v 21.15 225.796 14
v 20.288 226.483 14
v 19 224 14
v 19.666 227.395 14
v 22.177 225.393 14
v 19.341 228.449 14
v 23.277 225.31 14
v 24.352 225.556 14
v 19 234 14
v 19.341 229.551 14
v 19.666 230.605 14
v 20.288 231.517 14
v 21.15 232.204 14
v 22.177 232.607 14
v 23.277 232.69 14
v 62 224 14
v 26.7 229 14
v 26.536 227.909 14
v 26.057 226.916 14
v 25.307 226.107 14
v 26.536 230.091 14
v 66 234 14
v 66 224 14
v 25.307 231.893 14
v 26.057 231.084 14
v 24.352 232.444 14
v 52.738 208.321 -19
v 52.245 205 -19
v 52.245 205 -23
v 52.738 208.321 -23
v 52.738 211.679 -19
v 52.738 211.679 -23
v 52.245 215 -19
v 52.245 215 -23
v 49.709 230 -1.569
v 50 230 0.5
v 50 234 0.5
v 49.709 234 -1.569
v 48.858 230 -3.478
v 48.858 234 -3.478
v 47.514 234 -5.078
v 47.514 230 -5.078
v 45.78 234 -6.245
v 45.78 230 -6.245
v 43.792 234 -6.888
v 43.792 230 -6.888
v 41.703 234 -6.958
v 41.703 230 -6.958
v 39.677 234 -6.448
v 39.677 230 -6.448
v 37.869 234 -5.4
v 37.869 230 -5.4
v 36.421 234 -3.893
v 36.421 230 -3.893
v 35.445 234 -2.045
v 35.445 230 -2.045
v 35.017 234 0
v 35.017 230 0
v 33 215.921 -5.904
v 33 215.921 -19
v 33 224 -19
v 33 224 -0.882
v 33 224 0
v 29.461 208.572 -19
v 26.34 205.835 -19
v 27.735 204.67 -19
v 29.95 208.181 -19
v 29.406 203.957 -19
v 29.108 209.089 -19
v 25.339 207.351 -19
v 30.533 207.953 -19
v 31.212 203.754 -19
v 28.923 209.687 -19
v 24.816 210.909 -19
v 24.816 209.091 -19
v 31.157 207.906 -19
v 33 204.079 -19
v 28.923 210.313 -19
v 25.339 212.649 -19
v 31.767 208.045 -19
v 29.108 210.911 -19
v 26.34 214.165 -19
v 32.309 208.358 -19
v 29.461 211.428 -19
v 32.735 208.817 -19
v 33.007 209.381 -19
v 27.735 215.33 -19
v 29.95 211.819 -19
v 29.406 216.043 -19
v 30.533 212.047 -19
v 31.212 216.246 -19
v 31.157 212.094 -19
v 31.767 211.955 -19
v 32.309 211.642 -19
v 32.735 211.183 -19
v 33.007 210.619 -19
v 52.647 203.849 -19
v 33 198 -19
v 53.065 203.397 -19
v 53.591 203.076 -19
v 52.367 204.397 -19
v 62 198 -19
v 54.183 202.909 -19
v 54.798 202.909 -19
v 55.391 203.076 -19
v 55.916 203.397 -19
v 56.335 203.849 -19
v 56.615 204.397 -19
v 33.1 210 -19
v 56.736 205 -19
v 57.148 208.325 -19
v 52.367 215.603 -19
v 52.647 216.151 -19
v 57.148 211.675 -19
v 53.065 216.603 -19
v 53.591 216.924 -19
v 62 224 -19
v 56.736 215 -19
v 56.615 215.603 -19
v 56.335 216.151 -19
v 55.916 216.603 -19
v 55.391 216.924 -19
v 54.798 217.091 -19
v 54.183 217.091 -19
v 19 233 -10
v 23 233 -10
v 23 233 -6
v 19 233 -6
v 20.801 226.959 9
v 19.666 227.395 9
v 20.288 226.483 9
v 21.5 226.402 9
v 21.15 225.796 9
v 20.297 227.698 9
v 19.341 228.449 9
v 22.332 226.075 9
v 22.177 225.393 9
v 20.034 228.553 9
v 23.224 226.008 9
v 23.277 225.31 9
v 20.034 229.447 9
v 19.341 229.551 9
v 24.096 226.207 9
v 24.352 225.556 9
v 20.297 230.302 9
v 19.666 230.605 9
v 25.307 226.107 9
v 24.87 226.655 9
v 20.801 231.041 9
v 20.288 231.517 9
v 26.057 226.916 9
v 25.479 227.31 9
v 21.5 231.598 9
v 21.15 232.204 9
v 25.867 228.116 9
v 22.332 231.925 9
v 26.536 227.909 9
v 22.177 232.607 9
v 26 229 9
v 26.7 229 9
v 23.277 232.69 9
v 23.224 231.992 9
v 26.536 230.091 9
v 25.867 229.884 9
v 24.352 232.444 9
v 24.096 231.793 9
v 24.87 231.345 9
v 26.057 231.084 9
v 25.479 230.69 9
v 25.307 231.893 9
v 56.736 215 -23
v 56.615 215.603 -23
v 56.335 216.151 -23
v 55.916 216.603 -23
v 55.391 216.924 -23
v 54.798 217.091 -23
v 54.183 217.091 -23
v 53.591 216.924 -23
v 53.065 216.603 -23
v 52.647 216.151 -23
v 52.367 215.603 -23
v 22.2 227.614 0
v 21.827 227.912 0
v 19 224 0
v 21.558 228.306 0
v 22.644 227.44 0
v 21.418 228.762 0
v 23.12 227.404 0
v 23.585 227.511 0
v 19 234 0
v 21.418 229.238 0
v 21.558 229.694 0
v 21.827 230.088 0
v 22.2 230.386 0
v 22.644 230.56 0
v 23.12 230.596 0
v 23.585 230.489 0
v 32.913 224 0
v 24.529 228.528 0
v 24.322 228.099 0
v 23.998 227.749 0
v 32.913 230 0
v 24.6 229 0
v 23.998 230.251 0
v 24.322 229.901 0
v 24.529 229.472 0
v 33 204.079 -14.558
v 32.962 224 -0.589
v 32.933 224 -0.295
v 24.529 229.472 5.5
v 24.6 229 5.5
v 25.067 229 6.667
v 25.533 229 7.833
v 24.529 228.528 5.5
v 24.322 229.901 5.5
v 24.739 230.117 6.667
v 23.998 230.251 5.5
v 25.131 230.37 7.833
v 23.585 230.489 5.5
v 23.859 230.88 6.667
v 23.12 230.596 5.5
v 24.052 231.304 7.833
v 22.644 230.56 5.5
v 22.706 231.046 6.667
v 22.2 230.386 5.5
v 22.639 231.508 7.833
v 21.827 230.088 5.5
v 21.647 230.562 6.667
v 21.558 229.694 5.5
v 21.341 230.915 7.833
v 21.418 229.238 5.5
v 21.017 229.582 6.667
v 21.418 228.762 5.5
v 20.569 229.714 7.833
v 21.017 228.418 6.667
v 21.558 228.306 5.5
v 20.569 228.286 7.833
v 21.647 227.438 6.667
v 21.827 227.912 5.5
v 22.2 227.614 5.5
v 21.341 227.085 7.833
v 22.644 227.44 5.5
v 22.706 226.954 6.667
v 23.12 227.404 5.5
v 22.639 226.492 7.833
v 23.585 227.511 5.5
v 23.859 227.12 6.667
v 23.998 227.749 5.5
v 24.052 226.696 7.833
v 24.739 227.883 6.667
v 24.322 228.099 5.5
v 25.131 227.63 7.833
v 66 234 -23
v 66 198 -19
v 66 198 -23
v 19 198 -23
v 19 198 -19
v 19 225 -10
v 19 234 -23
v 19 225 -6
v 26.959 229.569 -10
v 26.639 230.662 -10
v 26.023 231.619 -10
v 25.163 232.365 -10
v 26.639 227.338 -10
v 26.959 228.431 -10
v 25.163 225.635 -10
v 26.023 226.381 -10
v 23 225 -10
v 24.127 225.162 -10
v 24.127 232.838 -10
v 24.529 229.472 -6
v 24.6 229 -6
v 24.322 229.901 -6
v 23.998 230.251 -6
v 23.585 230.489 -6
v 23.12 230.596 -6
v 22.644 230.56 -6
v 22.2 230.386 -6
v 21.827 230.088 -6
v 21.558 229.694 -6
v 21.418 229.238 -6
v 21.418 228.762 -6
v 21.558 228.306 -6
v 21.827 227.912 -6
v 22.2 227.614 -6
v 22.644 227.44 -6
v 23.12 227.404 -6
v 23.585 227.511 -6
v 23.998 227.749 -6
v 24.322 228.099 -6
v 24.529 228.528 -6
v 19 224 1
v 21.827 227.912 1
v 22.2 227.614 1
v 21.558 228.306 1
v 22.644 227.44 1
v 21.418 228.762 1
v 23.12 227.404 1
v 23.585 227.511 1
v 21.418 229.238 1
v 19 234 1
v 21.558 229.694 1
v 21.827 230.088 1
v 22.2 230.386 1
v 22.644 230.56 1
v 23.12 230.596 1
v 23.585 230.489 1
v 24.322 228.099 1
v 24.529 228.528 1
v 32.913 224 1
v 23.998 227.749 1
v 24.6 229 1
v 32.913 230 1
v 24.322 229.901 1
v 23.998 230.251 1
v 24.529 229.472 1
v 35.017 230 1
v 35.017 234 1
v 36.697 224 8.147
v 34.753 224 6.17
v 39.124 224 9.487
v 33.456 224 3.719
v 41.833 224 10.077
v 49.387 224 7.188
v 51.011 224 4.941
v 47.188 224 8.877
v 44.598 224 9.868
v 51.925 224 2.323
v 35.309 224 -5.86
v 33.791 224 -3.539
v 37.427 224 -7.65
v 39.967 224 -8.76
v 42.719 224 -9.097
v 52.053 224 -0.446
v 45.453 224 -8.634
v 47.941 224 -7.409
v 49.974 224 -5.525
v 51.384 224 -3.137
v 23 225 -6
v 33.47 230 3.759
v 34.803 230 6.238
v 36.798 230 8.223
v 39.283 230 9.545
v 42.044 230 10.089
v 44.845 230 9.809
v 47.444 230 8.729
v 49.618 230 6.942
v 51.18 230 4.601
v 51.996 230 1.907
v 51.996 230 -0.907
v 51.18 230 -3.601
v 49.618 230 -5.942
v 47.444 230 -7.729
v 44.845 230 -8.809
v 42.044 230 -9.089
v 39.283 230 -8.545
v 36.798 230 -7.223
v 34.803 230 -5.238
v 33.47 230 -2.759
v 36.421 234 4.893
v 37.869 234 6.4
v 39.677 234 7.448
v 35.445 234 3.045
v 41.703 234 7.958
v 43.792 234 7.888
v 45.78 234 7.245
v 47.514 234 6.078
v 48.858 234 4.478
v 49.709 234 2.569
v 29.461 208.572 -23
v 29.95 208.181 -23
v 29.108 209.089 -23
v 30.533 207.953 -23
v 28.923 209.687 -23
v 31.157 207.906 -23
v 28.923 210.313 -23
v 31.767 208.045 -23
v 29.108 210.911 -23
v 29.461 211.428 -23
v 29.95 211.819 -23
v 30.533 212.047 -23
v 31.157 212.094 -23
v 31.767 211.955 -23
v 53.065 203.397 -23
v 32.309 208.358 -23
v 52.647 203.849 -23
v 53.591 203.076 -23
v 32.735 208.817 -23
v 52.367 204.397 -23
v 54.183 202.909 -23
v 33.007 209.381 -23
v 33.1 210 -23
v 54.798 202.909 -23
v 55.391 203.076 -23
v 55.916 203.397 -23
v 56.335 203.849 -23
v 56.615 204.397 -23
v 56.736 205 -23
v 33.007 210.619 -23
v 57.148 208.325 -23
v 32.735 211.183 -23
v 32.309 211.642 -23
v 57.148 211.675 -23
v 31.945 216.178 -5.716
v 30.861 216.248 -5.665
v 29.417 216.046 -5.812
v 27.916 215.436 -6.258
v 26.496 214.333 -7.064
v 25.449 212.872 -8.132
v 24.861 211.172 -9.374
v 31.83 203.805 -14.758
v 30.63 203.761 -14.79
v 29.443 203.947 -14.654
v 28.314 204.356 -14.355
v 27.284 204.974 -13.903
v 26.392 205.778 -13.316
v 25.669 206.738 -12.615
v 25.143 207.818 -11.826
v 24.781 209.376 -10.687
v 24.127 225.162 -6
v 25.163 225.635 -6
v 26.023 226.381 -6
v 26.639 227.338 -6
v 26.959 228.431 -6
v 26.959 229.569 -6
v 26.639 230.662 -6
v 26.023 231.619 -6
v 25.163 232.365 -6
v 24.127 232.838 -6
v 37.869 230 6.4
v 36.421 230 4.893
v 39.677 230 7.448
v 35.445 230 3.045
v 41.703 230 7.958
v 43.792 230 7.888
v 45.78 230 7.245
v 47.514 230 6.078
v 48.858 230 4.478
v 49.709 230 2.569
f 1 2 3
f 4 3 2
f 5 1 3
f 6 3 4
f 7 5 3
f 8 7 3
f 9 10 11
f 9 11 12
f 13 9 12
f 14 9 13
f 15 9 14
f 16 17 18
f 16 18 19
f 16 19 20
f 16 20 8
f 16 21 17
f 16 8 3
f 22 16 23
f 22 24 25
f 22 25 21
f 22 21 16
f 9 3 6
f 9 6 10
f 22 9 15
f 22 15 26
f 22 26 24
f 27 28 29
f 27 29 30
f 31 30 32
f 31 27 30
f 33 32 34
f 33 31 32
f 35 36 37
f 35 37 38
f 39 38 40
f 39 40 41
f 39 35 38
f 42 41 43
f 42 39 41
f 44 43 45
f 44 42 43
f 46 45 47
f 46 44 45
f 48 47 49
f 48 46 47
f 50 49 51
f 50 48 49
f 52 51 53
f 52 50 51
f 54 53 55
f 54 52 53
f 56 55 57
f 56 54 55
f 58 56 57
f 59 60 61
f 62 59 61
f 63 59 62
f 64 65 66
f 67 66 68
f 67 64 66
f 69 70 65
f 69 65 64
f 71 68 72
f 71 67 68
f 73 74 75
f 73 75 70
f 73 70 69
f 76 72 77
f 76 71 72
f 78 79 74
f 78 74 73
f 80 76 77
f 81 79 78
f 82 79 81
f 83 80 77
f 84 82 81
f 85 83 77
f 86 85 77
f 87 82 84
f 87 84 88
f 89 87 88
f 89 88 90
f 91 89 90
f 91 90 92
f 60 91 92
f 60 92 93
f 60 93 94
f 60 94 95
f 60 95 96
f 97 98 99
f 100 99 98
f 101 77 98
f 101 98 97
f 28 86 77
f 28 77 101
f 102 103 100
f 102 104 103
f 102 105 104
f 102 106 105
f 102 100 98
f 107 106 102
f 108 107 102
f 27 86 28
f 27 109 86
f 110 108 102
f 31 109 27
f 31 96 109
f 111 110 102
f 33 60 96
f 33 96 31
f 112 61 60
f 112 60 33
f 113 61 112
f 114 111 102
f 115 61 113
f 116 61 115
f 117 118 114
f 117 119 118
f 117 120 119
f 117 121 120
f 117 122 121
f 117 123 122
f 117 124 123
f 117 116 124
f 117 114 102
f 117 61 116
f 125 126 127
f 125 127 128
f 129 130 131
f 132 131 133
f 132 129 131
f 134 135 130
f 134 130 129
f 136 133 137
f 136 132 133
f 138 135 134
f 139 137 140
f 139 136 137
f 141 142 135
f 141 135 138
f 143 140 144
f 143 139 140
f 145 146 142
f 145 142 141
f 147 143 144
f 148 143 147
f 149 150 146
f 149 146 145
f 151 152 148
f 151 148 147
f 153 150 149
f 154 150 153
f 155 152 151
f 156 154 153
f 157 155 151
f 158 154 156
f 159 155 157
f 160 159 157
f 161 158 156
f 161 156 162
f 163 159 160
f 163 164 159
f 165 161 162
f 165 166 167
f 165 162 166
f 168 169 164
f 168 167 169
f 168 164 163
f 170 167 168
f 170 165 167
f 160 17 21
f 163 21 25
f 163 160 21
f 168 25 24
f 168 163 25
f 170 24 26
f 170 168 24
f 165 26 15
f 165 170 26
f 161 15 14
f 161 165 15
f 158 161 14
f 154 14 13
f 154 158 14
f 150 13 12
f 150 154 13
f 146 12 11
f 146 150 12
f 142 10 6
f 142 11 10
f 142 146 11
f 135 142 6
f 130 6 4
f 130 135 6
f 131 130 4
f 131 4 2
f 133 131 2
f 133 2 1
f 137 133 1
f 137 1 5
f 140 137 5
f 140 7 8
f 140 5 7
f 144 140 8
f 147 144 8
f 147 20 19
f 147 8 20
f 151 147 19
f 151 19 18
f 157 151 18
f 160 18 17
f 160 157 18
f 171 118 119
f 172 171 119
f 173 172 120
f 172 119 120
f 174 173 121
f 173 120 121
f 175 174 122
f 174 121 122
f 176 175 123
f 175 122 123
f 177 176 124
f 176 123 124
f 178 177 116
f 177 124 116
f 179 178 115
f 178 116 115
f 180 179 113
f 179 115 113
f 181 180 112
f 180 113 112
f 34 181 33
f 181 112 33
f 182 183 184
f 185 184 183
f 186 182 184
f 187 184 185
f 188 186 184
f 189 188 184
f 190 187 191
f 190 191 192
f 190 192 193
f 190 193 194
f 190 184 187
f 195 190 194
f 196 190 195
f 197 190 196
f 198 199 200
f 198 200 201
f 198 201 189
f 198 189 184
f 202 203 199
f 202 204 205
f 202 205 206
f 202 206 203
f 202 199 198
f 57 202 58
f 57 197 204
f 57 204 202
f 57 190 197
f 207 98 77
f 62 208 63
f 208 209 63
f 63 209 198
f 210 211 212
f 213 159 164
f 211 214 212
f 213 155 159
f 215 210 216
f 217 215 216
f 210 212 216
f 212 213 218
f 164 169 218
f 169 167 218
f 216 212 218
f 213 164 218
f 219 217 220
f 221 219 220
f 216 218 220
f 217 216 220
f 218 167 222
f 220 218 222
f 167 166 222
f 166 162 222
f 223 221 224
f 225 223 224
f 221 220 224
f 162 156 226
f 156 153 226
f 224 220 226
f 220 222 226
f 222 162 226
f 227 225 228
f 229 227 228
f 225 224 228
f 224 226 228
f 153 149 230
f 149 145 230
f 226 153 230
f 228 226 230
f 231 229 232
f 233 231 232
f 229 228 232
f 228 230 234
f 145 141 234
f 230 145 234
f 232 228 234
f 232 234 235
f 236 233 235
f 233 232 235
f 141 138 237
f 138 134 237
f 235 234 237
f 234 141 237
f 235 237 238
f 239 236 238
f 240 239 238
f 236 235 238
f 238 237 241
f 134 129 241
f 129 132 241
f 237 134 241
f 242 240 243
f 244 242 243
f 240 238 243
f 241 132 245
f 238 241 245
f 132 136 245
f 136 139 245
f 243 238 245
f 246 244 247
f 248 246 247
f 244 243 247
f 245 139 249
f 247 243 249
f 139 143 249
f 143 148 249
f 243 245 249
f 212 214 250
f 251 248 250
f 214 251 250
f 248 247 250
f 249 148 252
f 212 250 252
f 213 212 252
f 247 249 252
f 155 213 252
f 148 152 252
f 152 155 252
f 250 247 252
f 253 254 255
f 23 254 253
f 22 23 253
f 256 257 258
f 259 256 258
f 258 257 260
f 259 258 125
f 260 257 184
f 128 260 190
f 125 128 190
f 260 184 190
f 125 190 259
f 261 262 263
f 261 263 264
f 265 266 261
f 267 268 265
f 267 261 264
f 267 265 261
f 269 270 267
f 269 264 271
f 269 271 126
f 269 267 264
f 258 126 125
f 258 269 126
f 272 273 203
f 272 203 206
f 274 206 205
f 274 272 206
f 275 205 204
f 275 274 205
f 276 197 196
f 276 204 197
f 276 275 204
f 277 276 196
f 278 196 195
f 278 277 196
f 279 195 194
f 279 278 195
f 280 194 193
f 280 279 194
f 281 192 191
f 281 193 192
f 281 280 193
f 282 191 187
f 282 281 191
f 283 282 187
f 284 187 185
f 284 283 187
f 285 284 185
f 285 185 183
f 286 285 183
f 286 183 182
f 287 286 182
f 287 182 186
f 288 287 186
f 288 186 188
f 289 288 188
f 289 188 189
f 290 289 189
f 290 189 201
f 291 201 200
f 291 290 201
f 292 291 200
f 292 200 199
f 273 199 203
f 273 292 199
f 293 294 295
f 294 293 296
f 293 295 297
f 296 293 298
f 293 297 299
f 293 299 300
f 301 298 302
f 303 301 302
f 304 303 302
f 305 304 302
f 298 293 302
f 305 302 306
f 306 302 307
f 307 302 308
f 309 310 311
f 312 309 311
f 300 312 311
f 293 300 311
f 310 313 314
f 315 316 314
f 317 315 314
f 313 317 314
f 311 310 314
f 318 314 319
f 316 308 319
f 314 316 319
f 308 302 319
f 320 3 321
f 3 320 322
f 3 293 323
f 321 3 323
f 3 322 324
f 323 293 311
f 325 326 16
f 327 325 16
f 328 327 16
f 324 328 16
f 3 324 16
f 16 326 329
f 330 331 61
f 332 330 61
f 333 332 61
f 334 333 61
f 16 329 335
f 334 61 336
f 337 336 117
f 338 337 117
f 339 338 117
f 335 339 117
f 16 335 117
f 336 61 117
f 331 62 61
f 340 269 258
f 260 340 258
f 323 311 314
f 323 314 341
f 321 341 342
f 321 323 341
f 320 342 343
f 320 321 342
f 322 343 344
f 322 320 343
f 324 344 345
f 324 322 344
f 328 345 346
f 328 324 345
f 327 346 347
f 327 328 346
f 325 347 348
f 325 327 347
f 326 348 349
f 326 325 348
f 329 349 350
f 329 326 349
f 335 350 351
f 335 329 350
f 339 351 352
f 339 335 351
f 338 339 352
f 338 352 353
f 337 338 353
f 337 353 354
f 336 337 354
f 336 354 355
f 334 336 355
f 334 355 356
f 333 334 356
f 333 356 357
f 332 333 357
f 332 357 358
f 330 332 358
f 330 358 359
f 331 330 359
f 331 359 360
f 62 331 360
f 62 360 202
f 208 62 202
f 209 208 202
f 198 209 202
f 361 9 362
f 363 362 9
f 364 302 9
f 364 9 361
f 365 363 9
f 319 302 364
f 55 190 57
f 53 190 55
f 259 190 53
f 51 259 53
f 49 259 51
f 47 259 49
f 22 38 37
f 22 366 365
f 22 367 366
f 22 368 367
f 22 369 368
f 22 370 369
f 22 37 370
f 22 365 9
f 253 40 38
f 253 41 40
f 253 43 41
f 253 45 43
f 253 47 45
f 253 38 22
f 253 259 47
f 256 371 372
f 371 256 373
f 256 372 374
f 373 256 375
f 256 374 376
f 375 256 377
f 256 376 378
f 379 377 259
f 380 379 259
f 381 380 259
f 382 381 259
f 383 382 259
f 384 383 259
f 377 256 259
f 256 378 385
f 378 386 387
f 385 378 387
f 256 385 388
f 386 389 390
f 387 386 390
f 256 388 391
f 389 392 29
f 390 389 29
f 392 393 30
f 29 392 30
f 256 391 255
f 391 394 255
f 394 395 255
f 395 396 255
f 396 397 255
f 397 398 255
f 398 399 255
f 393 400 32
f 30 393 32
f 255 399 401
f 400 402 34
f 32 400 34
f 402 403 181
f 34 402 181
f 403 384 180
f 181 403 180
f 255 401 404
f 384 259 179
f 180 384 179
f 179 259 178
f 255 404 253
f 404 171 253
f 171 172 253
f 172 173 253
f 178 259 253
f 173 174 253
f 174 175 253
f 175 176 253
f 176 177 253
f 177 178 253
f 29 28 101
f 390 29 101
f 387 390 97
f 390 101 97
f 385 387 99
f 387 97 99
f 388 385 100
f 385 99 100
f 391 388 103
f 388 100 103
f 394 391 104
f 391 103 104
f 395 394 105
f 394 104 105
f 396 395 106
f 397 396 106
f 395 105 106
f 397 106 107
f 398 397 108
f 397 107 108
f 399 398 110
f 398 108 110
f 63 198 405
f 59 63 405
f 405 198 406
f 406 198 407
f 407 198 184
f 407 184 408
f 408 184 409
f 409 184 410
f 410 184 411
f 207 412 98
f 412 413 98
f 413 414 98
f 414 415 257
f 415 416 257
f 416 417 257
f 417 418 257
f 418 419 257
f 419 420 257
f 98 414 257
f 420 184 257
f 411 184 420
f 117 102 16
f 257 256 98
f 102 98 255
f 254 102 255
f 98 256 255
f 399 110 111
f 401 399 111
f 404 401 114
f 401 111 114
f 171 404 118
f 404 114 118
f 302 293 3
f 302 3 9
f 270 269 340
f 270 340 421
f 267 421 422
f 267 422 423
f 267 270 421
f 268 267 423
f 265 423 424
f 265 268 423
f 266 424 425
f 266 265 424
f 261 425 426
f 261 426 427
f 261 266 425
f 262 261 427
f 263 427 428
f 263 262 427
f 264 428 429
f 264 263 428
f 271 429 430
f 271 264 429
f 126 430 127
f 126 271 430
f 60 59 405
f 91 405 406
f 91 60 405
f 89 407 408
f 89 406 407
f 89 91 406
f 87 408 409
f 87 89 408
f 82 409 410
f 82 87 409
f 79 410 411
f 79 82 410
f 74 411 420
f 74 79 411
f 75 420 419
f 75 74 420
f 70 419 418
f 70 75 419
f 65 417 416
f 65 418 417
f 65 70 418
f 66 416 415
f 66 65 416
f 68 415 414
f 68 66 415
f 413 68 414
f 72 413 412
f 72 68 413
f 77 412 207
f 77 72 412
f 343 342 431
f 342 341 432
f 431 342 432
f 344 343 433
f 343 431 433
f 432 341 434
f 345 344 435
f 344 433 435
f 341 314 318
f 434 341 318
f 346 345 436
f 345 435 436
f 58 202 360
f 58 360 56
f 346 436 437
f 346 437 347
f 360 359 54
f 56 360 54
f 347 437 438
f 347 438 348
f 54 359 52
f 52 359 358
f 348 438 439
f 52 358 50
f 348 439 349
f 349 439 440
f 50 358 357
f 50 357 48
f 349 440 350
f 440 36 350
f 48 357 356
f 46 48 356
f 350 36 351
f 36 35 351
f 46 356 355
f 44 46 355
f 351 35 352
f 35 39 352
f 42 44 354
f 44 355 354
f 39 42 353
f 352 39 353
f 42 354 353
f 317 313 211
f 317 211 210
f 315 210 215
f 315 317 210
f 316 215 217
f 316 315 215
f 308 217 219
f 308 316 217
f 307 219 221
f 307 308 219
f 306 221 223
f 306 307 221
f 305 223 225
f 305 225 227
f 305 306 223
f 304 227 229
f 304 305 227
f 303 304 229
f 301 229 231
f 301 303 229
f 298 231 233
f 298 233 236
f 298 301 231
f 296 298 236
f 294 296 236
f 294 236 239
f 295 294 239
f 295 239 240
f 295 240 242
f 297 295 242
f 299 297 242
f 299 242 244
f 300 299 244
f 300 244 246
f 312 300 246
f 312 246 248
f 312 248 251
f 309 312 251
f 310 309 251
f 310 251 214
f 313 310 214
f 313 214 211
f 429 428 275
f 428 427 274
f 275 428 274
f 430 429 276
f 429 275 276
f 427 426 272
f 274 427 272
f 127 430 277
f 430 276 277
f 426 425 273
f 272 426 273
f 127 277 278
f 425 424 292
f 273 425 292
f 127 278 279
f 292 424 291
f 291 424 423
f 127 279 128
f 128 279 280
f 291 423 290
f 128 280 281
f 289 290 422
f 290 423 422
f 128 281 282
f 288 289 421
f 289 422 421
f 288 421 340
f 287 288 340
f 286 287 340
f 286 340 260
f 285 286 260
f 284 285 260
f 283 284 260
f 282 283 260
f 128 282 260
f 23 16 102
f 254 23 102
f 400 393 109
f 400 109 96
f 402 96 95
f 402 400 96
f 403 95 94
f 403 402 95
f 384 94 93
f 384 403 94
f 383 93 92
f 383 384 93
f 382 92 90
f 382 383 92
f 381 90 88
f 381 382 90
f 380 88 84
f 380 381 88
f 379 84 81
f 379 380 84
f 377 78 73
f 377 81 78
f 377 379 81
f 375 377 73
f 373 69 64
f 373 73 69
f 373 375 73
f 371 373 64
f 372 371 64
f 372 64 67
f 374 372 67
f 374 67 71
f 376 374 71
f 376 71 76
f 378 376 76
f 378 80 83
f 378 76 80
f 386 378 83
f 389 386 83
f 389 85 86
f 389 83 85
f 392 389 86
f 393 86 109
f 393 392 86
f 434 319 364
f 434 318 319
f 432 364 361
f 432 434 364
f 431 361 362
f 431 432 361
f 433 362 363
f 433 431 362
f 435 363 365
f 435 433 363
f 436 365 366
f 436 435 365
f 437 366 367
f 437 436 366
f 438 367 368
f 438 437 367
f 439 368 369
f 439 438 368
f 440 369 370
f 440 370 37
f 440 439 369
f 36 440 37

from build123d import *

# Parameters (mm, degrees)
CYLINDER052_R             = 6.25
CYLINDER052_DEPTH         = 17
CYLINDER051_R             = 2.1
CYLINDER051_DEPTH         = 10
EXTRUDE014_DEPTH          = 10
EXTRUDE016_DEPTH          = 14
EXTRUDE015_DEPTH          = 4
BOX021_W                  = 47
BOX021_H                  = 26
BOX021_DEPTH              = 4
CYLINDER044_R             = 4
CYLINDER044_DEPTH         = 4
BOX014_W                  = 13
BOX014_H                  = 8
BOX014_DEPTH              = 4
FUSION015_PLACEMENT_ANGLE = 180
CYLINDER039_R             = 1.6
CYLINDER039_DEPTH         = 15
CYLINDER043_R             = 3.7
CYLINDER043_DEPTH         = 10
CYLINDER045_R             = 7.5
CYLINDER045_DEPTH         = 6
CYLINDER042_R             = 9.6
CYLINDER042_DEPTH         = 6
BOX012_W                  = 26
BOX012_H                  = 42
BOX012_DEPTH              = 1
BOX013_W                  = 47
BOX013_H                  = 10
BOX013_DEPTH              = 37


with BuildPart() as cylinder052:
    # Cylinder052 → Cylinder052 (new body)
    with BuildSketch(Plane.XY.offset(10)):
        Circle(CYLINDER052_R)
    extrude(amount=CYLINDER052_DEPTH)


with BuildPart() as fusion022:
    # Cylinder051 → Cylinder051 (new body)
    with BuildSketch(Plane.XY):
        Circle(CYLINDER051_R)
    extrude(amount=CYLINDER051_DEPTH)

    # Fusion022: union Cylinder052
    add(cylinder052.part)


with BuildPart() as fusion022_1:
    # Fusion022 placement: moved
    add(fusion022.part.moved(Location((12, 12, -6))))


with BuildPart() as extrude014:
    # Sketch010 → Extrude014 (new body)
    with BuildSketch(Plane.XY):
        with BuildLine():
            ThreePointArc((35.736492, 10), (36.2, 15), (35.736492, 20))
            ThreePointArc((35.736492, 20), (33.490746, 22.111711), (31.244999, 20))
            ThreePointArc((31.244999, 10), (31.8, 15), (31.244999, 20))
            ThreePointArc((31.244999, 10), (33.490746, 7.888289), (35.736492, 10))
        make_face()
    extrude(amount=-EXTRUDE014_DEPTH)


with BuildPart() as extrude014_1:
    # Extrude014 placement: moved
    add(extrude014.part.moved(Location((2, -3, 8))))


with BuildPart() as extrude016:
    # Sketch015 → Extrude016 (new body)
    with BuildSketch(Plane.YZ):
        Polygon((0, 4), (26, 4), (26, 23), align=None)
    extrude(amount=EXTRUDE016_DEPTH)


with BuildPart() as extrude015:
    # Sketch014 → Extrude015 (new body)
    with BuildSketch(Plane.YZ):
        Polygon((0, 4), (26, 4), (26, 37), align=None)
    extrude(amount=EXTRUDE015_DEPTH)


with BuildPart() as extrude015_1:
    # Extrude015 placement: moved
    add(extrude015.part.moved(Location((43, 0, 0))))


with BuildPart() as box021:
    # Box021 → Box021 (new body)
    with BuildSketch(Plane.XY):
        with Locations((23.5, 13)):
            Rectangle(BOX021_W, BOX021_H)
    extrude(amount=BOX021_DEPTH)


with BuildPart() as cylinder044:
    # Cylinder044 → Cylinder044 (new body)
    with BuildSketch(Plane(origin=(9, 11, -8), x_dir=(1, 0, 0), z_dir=(0, 0, 1))):
        Circle(CYLINDER044_R)
    extrude(amount=CYLINDER044_DEPTH)


with BuildPart() as fusion015:
    # Box014 → Box014 (new body)
    with BuildSketch(Plane(origin=(9, 7, -8), x_dir=(1, 0, 0), z_dir=(0, 0, 1))):
        with Locations((6.5, 4)):
            Rectangle(BOX014_W, BOX014_H)
    extrude(amount=BOX014_DEPTH)

    # Fusion015: union Cylinder044
    add(cylinder044.part)


with BuildPart() as fusion015_1:
    # Fusion015 placement: moved
    add(fusion015.part.moved(Location((13, 42, 21))).rotate(Axis((13, 42, 21), (0, 0, 1)), FUSION015_PLACEMENT_ANGLE))


with BuildPart() as cylinder039:
    # Cylinder039 → Cylinder039 (new body)
    with BuildSketch(Plane.XY):
        Circle(CYLINDER039_R)
    extrude(amount=CYLINDER039_DEPTH)


with BuildPart() as fusion016:
    # Cone002 → Cone002 (revolve)
    with BuildSketch(Plane(origin=(0, 0, 15), x_dir=(1, 0, 0), z_dir=(0, -1, 0))):
        Polygon((0, 0), (1.6, 0), (3, 3.5), (0, 3.5), align=None)
    revolve(axis=Axis((0, 0, 15), (0, 0, 1)))

    # Fusion016: union Cylinder039
    add(cylinder039.part)


with BuildPart() as fusion016_1:
    # Fusion016 placement: moved
    add(fusion016.part.moved(Location((4, 31, 13.5))))


with BuildPart() as cylinder043:
    # Cylinder043 → Cylinder043 (new body)
    with BuildSketch(Plane(origin=(4, 31, 32), x_dir=(1, 0, 0), z_dir=(0, 0, 1))):
        Circle(CYLINDER043_R)
    extrude(amount=CYLINDER043_DEPTH)


with BuildPart() as cylinder045:
    # Cylinder045 → Cylinder045 (new body)
    with BuildSketch(Plane(origin=(23.5, 30, 23.5), x_dir=(1, 0, 0), z_dir=(0, 1, 0))):
        Circle(CYLINDER045_R)
    extrude(amount=CYLINDER045_DEPTH)


with BuildPart() as cylinder042:
    # Cylinder042 → Cylinder042 (new body)
    with BuildSketch(Plane(origin=(23.5, 26, 23.5), x_dir=(1, 0, 0), z_dir=(0, 1, 0))):
        Circle(CYLINDER042_R)
    extrude(amount=CYLINDER042_DEPTH)


with BuildPart() as box012:
    # Box012 → Box012 (new body)
    with BuildSketch(Plane(origin=(-4, 13, 23), x_dir=(1, 0, 0), z_dir=(0, 0, 1))):
        with Locations((13, 21)):
            Rectangle(BOX012_W, BOX012_H)
    extrude(amount=BOX012_DEPTH)


with BuildPart() as cut054:
    # Box013 → Box013 (new body)
    with BuildSketch(Plane(origin=(0, 26, 0), x_dir=(1, 0, 0), z_dir=(0, 0, 1))):
        with Locations((23.5, 5)):
            Rectangle(BOX013_W, BOX013_H)
    extrude(amount=BOX013_DEPTH)

    # Cut047: cut Box012
    add(box012.part, mode=Mode.SUBTRACT)

    # Cut048: cut Cylinder042
    add(cylinder042.part, mode=Mode.SUBTRACT)

    # Cut049: cut Cylinder045
    add(cylinder045.part, mode=Mode.SUBTRACT)

    # Cut050: cut Cylinder043
    add(cylinder043.part, mode=Mode.SUBTRACT)

    # Cut051: cut Fusion016
    add(fusion016_1.part, mode=Mode.SUBTRACT)

    # Cut052: cut Fusion015
    add(fusion015_1.part, mode=Mode.SUBTRACT)

    # Fusion023: union Box021
    add(box021.part)

    # Fusion024: union Extrude016, Extrude015
    add(extrude016.part)
    add(extrude015_1.part)

    # Cut053: cut Extrude014
    add(extrude014_1.part, mode=Mode.SUBTRACT)

    # Cut054: cut Fusion022
    add(fusion022_1.part, mode=Mode.SUBTRACT)


with BuildPart() as cut054_1:
    # Cut054 placement: moved
    add(cut054.part.moved(Location((19, 198, -23))))


solid = cut054_1.part
